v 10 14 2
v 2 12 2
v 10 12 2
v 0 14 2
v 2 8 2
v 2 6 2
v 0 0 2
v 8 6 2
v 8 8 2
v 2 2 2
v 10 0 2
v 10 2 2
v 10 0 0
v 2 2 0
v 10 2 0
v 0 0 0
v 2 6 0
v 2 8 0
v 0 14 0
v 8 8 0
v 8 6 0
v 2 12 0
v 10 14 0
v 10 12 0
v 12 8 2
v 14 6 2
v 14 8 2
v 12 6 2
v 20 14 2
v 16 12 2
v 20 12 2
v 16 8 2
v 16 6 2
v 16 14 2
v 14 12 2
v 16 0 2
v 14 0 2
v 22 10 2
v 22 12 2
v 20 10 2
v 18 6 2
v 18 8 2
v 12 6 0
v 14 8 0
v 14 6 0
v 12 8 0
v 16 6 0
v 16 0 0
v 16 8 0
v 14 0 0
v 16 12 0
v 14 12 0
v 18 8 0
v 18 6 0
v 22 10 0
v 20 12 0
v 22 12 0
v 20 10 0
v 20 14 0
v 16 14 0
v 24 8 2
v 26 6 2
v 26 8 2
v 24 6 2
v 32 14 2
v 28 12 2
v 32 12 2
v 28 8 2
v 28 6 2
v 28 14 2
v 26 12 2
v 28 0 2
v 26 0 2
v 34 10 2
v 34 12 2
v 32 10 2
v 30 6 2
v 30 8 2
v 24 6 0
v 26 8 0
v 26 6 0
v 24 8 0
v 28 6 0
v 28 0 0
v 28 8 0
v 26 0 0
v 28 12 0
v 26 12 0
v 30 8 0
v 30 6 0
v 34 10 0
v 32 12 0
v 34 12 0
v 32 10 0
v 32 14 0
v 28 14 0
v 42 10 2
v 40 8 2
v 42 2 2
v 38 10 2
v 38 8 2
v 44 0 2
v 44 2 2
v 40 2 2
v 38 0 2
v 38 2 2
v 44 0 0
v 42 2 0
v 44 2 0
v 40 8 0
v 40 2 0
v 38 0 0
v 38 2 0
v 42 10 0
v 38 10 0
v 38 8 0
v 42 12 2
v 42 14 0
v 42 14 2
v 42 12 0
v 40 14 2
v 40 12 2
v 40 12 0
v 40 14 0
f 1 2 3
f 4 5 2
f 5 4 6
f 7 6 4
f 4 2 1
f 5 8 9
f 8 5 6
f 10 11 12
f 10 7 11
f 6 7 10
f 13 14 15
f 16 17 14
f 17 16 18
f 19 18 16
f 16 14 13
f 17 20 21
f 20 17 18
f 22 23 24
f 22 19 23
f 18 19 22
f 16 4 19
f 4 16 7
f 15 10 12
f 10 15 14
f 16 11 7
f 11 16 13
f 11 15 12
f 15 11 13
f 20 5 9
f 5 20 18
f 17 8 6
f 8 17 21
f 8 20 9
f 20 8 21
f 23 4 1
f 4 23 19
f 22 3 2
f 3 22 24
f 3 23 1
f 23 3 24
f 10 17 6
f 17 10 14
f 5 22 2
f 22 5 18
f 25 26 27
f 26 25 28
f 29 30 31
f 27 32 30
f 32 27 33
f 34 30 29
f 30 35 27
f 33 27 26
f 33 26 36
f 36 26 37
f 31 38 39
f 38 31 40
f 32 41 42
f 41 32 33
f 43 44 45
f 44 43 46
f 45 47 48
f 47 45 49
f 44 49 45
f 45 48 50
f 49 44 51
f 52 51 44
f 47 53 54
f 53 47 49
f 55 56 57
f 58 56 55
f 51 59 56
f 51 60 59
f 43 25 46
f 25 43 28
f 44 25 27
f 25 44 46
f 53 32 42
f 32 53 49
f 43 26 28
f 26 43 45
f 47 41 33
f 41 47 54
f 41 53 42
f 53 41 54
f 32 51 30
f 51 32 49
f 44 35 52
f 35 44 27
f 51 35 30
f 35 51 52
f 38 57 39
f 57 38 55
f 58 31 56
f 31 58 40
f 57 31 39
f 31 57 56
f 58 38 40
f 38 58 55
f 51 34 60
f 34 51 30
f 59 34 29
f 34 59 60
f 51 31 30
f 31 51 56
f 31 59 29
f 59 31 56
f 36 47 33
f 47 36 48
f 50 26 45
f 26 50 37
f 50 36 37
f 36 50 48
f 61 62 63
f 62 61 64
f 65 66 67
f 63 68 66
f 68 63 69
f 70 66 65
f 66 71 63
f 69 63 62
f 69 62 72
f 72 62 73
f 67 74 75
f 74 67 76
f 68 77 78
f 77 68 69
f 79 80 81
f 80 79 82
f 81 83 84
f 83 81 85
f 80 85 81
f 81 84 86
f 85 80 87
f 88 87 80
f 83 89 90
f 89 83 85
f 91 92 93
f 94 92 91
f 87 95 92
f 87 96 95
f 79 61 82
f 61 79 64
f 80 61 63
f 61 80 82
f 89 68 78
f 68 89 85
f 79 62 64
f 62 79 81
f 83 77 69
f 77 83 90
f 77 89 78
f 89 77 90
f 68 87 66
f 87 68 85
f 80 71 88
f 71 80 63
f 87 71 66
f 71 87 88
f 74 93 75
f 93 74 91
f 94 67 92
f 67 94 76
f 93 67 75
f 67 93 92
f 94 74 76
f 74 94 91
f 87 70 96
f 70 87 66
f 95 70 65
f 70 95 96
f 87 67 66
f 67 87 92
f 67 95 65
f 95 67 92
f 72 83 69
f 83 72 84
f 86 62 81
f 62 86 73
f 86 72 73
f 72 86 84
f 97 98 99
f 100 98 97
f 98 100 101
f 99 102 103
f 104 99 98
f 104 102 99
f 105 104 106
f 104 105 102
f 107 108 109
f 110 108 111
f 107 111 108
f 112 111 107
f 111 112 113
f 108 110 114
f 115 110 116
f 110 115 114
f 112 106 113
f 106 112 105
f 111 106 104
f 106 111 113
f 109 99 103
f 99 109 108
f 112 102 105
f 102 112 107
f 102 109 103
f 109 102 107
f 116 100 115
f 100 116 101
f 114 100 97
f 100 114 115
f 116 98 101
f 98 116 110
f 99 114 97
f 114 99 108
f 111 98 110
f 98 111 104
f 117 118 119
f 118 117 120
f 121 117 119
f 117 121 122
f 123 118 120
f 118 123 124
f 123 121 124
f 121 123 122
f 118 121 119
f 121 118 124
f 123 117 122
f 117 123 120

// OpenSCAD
//Draw text
scale([2,2,2]) drawtext("Effi");

//Draw character set
//scale([2,2,2]) drawtext(" !\"#$%&'()*+,-./0123456789:;<=>?@ABCDEFGHIJKLMNOPQRSTUVWXYZ[\\]^_`abcdefghijklmnopqrstuvwxyz{|}");

module drawtext(text) {
	//Characters
	chars = " !\"#$%&'()*+,-./0123456789:;<=>?@ABCDEFGHIJKLMNOPQRSTUVWXYZ[\\]^_`abcdefghijklmnopqrstuvwxyz{|}";

	//Chracter table defining 5x7 characters
	//Adapted from: http://www.geocities.com/dinceraydin/djlcdsim/chartable.js
	char_table = [ [ 0, 0, 0, 0, 0, 0, 0],
                  [ 4, 0, 4, 4, 4, 4, 4],
                  [ 0, 0, 0, 0,10,10,10],
                  [10,10,31,10,31,10,10],
                  [ 4,30, 5,14,20,15, 4],
                  [ 3,19, 8, 4, 2,25,24],
                  [13,18,21, 8,20,18,12],
                  [ 0, 0, 0, 0, 8, 4,12],
                  [ 2, 4, 8, 8, 8, 4, 2],
                  [ 8, 4, 2, 2, 2, 4, 8],
                  [ 0, 4,21,14,21, 4, 0],
                  [ 0, 4, 4,31, 4, 4, 0],
                  [ 8, 4,12, 0, 0, 0, 0],
                  [ 0, 0, 0,31, 0, 0, 0],
                  [12,12, 0, 0, 0, 0, 0],
                  [ 0,16, 8, 4, 2, 1, 0],
                  [14,17,25,21,19,17,14],
                  [14, 4, 4, 4, 4,12, 4],
                  [31, 8, 4, 2, 1,17,14],
                  [14,17, 1, 2, 4, 2,31],
                  [ 2, 2,31,18,10, 6, 2],
                  [14,17, 1, 1,30,16,31],
                  [14,17,17,30,16, 8, 6],
                  [ 8, 8, 8, 4, 2, 1,31],
                  [14,17,17,14,17,17,14],
                  [12, 2, 1,15,17,17,14],
                  [ 0,12,12, 0,12,12, 0],
                  [ 8, 4,12, 0,12,12, 0],
                  [ 2, 4, 8,16, 8, 4, 2],
                  [ 0, 0,31, 0,31, 0, 0],
                  [16, 8, 4, 2, 4, 8,16],
                  [ 4, 0, 4, 2, 1,17,14],
                  [14,21,21,13, 1,17,14],
                  [17,17,31,17,17,17,14],
                  [30,17,17,30,17,17,30],
                  [14,17,16,16,16,17,14],
                  [30,17,17,17,17,17,30],
                  [31,16,16,30,16,16,31],
                  [16,16,16,30,16,16,31],
                  [15,17,17,23,16,17,14],
                  [17,17,17,31,17,17,17],
                  [14, 4, 4, 4, 4, 4,14],
                  [12,18, 2, 2, 2, 2, 7],
                  [17,18,20,24,20,18,17],
                  [31,16,16,16,16,16,16],
                  [17,17,17,21,21,27,17],
                  [17,17,19,21,25,17,17],
                  [14,17,17,17,17,17,14],
                  [16,16,16,30,17,17,30],
                  [13,18,21,17,17,17,14],
                  [17,18,20,30,17,17,30],
                  [30, 1, 1,14,16,16,15],
                  [ 4, 4, 4, 4, 4, 4,31],
                  [14,17,17,17,17,17,17],
                  [ 4,10,17,17,17,17,17],
                  [10,21,21,21,17,17,17],
                  [17,17,10, 4,10,17,17],
                  [ 4, 4, 4,10,17,17,17],
                  [31,16, 8, 4, 2, 1,31],
                  [14, 8, 8, 8, 8, 8,14],
                  [ 0, 1, 2, 4, 8,16, 0],
                  [14, 2, 2, 2, 2, 2,14],
                  [ 0, 0, 0, 0,17,10, 4],
                  [31, 0, 0, 0, 0, 0, 0],
                  [ 0, 0, 0, 0, 2, 4, 8],
                  [15,17,15, 1,14, 0, 0],
                  [30,17,17,25,22,16,16],
                  [14,17,16,16,14, 0, 0],
                  [15,17,17,19,13, 1, 1],
                  [14,16,31,17,14, 0, 0],
                  [ 8, 8, 8,28, 8, 9, 6],
                  [14, 1,15,17,15, 0, 0],
                  [17,17,17,25,22,16,16],
                  [14, 4, 4, 4,12, 0, 4],
                  [12,18, 2, 2, 2, 6, 2],
                  [18,20,24,20,18,16,16],
                  [14, 4, 4, 4, 4, 4,12],
                  [17,17,21,21,26, 0, 0],
                  [17,17,17,25,22, 0, 0],
                  [14,17,17,17,14, 0, 0],
                  [16,16,30,17,30, 0, 0],
                  [ 1, 1,15,19,13, 0, 0],
                  [16,16,16,25,22, 0, 0],
                  [30, 1,14,16,15, 0, 0],
                  [ 6, 9, 8, 8,28, 8, 8],
                  [13,19,17,17,17, 0, 0],
                  [ 4,10,17,17,17, 0, 0],
                  [10,21,21,17,17, 0, 0],
                  [17,10, 4,10,17, 0, 0],
                  [14, 1,15,17,17, 0, 0],
                  [31, 8, 4, 2,31, 0, 0],
                  [ 2, 4, 4, 8, 4, 4, 2],
                  [ 4, 4, 4, 4, 4, 4, 4],
                  [ 8, 4, 4, 2, 4, 4, 8] ];

	//Binary decode table
	dec_table = [ "00000", "00001", "00010", "00011", "00100", "00101",
  	            "00110", "00111", "01000", "01001", "01010", "01011",
  	            "01100", "01101", "01110", "01111", "10000", "10001",
  	            "10010", "10011", "10100", "10101", "10110", "10111",
	            "11000", "11001", "11010", "11011", "11100", "11101",
	            "11110", "11111" ];

	//Process string one character at a time
	for(itext = [0:len(text)-1]) {
		//Convert character to index
		assign(ichar = search(text[itext],chars,1)[0]) {
			//Decode character - rows
			for(irow = [0:6]) {
				assign(val = dec_table[char_table[ichar][irow]]) {
					//Decode character - cols
					for(icol = [0:4]) {
						assign(bit = search(val[icol],"01",1)[0]) {
							if(bit) {
								//Output cube
								translate([icol + (6*itext), irow, 0])
									cube([1.0001,1.0001,1]);
							}
						}
					}
				}
			}
		}
	}
}
